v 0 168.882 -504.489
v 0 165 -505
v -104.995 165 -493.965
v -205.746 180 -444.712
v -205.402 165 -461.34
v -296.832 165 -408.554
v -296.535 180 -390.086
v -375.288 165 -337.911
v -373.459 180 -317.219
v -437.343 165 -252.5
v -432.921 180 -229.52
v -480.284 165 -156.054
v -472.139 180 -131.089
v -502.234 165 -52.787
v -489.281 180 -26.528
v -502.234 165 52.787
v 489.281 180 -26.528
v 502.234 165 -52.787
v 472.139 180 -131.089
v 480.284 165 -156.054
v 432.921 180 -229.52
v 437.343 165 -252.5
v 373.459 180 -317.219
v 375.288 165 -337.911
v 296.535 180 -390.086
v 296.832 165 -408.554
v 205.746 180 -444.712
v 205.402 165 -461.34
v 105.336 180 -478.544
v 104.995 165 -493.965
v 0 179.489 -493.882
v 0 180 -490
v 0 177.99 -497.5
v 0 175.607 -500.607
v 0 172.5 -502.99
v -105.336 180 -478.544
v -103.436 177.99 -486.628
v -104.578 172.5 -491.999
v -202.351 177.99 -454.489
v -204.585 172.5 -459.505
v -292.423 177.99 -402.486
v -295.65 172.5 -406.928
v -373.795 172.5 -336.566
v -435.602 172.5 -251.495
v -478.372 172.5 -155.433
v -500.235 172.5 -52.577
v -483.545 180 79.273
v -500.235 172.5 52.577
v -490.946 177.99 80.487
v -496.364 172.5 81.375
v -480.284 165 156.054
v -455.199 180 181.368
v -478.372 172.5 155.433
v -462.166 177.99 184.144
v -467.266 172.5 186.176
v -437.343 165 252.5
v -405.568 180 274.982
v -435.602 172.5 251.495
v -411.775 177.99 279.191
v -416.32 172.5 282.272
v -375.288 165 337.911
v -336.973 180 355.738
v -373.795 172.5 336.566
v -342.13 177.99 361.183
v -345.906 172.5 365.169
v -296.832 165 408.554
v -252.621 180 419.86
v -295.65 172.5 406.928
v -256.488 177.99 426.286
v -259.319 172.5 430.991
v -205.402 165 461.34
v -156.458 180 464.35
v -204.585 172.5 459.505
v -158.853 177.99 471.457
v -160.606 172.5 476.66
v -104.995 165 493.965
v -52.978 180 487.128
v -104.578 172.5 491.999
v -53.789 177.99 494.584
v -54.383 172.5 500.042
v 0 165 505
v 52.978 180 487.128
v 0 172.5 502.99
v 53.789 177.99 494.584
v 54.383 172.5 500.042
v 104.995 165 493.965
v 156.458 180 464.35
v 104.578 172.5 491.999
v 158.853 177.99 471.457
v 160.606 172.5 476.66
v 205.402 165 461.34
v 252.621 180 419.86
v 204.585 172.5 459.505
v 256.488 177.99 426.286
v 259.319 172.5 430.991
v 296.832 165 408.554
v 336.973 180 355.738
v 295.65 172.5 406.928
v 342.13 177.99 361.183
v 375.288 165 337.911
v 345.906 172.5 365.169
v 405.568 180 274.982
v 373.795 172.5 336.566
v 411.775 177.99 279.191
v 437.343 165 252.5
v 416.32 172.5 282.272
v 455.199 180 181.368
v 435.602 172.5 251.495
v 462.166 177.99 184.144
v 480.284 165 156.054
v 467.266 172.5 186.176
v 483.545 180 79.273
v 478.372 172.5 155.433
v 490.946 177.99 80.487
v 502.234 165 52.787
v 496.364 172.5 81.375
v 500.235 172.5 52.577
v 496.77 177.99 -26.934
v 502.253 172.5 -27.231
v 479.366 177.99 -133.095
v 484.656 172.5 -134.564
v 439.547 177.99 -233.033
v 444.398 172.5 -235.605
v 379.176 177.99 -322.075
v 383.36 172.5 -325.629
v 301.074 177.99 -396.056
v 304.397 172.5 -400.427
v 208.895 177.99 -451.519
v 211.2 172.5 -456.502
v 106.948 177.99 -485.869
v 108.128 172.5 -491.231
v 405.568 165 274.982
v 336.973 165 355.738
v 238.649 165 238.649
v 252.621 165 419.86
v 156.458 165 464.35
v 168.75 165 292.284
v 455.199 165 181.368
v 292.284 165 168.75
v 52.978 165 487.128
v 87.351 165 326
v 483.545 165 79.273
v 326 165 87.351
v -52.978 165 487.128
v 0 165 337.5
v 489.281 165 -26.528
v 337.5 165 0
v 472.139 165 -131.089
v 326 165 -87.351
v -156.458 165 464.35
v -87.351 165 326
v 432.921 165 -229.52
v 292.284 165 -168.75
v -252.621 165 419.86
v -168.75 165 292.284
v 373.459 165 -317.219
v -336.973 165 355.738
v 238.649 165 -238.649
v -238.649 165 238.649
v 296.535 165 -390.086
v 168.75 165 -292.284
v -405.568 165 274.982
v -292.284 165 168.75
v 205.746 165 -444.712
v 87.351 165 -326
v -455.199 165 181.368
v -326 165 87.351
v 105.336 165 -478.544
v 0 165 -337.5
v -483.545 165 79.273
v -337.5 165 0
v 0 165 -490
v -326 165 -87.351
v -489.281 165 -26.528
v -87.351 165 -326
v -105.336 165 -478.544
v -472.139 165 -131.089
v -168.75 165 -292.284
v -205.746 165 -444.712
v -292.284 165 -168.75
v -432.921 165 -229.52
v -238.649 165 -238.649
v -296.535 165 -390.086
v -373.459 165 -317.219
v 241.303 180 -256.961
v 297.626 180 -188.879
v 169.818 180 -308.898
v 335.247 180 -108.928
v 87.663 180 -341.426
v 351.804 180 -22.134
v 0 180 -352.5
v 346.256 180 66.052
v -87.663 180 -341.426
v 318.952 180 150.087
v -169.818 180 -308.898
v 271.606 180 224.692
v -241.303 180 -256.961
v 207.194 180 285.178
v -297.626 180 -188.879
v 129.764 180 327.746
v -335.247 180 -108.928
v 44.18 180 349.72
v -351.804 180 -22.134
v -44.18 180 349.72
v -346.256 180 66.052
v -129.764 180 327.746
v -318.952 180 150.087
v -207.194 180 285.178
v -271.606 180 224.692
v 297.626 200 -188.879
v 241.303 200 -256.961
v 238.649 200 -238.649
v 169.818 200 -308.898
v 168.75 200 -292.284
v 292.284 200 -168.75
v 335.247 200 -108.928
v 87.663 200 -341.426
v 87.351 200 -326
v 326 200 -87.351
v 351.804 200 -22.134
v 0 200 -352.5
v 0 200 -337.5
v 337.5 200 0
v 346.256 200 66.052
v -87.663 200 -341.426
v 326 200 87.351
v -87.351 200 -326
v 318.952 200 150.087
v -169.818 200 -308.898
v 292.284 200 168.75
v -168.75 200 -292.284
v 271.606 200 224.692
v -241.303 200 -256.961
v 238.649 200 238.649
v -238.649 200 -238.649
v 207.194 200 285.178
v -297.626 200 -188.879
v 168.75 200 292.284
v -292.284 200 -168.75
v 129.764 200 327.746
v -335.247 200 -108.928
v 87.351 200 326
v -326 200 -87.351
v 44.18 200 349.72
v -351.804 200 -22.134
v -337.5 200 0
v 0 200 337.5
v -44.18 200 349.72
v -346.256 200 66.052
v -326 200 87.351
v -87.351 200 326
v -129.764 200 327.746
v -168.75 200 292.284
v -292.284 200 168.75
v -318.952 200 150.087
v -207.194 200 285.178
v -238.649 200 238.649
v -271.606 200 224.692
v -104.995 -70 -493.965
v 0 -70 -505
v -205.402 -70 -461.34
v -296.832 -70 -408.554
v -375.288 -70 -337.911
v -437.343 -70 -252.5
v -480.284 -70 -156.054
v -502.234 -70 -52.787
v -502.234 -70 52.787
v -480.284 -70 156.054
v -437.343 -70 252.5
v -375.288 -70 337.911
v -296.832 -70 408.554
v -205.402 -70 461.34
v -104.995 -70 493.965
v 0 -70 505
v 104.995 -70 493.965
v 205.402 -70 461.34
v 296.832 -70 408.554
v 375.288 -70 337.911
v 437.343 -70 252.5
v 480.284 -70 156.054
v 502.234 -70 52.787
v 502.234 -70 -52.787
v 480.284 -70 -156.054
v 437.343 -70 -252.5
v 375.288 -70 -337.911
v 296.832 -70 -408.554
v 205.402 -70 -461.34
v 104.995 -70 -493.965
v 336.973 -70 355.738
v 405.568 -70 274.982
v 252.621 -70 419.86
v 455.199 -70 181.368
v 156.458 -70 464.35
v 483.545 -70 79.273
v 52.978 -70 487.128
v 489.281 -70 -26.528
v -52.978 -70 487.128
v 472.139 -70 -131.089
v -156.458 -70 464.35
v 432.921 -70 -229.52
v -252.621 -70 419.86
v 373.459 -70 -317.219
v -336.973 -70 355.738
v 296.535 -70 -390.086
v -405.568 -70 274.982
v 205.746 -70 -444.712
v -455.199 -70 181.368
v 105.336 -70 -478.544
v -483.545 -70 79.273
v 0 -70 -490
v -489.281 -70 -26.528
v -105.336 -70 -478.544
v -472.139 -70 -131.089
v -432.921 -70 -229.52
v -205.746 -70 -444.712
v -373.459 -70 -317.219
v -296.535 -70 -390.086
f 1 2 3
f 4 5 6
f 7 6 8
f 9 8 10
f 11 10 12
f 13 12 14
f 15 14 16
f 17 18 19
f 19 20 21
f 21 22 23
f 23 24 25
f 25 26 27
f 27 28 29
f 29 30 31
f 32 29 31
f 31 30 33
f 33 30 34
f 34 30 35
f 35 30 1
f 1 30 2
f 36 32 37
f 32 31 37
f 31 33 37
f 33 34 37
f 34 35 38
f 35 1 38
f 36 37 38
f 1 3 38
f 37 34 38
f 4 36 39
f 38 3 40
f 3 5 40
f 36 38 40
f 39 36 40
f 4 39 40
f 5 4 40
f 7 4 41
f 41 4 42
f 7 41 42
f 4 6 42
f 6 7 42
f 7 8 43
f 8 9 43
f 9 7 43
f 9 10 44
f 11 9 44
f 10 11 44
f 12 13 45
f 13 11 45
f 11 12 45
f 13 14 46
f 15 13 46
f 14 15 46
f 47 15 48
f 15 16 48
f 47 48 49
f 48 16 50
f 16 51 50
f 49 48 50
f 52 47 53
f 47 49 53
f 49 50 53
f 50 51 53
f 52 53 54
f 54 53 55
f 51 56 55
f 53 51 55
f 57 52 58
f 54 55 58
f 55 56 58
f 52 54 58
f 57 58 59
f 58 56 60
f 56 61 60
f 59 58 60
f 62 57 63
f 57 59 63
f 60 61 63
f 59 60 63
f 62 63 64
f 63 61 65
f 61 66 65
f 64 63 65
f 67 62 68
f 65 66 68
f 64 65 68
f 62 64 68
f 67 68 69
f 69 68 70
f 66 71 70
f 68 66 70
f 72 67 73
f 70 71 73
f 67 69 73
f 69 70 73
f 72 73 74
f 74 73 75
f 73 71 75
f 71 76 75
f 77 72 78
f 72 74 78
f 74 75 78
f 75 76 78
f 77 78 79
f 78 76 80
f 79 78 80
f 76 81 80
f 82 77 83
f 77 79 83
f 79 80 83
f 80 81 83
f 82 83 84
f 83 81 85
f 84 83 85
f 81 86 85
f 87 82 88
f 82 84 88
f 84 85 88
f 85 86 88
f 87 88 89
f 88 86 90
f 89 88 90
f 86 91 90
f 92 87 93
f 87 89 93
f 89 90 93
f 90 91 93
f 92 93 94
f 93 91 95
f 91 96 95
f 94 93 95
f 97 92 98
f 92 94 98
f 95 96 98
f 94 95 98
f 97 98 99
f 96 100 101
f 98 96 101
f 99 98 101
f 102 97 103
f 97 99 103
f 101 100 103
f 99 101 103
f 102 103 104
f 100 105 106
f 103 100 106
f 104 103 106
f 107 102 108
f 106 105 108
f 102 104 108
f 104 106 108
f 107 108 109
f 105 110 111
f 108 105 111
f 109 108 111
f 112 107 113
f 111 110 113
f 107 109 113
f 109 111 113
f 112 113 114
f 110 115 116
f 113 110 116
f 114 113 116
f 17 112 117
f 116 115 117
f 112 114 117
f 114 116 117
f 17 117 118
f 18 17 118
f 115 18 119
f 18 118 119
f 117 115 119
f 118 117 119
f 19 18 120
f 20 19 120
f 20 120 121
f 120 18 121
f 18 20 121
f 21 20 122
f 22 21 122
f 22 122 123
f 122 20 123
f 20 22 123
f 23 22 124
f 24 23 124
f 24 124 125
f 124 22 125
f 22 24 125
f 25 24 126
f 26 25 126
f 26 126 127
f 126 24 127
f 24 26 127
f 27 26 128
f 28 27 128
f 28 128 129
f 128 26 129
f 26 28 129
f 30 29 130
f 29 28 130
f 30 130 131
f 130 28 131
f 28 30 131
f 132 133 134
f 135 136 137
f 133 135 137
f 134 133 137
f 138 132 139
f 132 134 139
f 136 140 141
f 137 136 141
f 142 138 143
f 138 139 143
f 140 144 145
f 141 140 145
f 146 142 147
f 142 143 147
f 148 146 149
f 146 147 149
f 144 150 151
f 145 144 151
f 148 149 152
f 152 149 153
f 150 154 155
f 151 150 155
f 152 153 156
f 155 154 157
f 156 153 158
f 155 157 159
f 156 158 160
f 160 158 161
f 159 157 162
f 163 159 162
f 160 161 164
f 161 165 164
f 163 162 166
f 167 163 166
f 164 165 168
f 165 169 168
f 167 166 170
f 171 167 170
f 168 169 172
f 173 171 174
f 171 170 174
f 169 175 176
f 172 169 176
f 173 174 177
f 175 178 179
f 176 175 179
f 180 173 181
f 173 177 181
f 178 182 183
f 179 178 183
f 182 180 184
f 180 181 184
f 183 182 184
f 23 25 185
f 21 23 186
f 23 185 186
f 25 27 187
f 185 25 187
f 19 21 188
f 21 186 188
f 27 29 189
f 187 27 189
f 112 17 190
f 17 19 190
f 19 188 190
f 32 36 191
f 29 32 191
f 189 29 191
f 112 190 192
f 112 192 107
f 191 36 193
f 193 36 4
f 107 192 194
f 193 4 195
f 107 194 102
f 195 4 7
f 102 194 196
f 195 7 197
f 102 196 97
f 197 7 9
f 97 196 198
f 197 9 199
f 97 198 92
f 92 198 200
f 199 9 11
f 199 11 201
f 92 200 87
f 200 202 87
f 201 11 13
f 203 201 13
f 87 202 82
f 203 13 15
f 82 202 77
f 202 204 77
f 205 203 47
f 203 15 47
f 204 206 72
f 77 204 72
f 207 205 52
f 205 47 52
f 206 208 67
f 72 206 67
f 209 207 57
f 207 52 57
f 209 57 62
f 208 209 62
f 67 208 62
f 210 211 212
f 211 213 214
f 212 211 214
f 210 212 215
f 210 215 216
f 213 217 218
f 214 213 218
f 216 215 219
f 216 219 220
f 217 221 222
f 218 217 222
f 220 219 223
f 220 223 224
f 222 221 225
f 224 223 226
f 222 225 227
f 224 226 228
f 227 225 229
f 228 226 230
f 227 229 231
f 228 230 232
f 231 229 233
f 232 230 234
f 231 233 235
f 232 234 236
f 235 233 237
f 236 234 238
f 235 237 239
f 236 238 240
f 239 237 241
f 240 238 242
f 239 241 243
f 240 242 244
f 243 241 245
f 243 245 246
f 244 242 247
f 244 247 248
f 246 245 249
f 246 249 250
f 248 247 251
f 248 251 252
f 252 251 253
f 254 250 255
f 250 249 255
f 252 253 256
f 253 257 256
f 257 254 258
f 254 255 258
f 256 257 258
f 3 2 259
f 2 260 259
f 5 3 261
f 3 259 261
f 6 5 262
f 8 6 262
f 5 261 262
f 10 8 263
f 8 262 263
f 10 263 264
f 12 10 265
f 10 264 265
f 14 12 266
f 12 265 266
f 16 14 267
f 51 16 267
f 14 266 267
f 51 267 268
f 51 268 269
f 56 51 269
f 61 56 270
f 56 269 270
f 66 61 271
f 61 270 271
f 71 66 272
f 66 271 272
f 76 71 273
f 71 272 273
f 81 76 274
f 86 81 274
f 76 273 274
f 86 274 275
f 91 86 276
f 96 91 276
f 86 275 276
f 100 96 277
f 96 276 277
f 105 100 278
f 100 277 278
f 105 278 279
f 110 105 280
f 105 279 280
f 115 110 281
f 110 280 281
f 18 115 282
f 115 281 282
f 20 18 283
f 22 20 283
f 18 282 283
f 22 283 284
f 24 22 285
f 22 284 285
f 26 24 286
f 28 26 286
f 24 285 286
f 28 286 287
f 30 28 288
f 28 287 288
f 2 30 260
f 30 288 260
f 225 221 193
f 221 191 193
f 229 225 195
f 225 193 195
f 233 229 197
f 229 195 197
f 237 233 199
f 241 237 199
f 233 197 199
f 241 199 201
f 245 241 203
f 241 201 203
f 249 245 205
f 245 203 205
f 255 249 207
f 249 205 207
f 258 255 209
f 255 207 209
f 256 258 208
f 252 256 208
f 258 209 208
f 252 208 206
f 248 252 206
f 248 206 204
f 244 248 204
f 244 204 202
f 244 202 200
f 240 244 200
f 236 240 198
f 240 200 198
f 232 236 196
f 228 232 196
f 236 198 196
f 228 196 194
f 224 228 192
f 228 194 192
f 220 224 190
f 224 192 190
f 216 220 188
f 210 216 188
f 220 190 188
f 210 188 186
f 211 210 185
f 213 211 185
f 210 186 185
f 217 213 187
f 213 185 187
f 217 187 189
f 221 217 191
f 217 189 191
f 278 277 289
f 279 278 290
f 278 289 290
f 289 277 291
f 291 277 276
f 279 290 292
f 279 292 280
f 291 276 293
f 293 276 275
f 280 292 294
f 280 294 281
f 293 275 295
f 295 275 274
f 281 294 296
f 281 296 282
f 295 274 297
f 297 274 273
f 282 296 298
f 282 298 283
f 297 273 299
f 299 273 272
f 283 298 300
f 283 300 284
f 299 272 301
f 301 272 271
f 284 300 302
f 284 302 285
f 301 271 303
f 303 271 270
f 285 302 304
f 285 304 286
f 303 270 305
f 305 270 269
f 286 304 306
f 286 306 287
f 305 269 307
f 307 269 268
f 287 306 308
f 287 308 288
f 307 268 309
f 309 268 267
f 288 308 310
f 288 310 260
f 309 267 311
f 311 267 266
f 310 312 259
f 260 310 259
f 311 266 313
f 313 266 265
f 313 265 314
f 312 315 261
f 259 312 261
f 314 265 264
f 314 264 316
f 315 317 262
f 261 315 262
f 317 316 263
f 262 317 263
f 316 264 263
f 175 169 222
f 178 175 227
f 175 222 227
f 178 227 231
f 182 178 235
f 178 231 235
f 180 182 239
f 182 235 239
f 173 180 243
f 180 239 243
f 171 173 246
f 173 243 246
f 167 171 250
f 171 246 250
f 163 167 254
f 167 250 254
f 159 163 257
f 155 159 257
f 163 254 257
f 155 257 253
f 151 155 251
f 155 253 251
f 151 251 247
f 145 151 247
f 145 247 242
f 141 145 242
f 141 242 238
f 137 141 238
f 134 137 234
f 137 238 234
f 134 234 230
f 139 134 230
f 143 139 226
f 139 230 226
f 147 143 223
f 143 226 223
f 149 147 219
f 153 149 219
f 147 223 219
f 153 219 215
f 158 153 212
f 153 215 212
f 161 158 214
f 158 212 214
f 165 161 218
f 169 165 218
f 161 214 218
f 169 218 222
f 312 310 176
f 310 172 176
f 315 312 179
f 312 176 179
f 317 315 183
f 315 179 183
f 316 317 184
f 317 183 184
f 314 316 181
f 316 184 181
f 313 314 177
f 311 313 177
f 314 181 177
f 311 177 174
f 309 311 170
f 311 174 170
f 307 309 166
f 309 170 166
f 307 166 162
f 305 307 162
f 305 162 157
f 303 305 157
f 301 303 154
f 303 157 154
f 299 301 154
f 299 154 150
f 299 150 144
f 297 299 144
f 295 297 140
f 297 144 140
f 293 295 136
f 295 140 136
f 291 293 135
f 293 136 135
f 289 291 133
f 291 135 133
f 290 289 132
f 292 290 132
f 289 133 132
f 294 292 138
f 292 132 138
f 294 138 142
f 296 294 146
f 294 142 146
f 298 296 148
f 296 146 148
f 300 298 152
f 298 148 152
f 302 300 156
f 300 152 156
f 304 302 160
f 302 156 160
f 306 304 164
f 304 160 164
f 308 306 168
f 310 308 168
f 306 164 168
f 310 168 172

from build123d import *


with BuildPart() as part:
    # Sketch6 → Revolve1 (revolve)
    with BuildSketch(Plane.XY, mode=Mode.PRIVATE) as revolve1_sk:
        with BuildLine():
            Line((337.5, 165), (337.5, 200))
            Line((337.5, 200), (352.5, 200))
            Line((352.5, 200), (352.5, 180))
            Line((352.5, 180), (490, 180))
            ThreePointArc((490, 180), (500.606601718, 175.606601718), (505, 165))
            Line((505, 165), (505, 0))
            Line((505, 0), (505, -70))
            Line((505, -70), (490, -70))
            Line((490, -70), (490, 0))
            Line((490, 0), (490, 165))
            Line((490, 165), (337.5, 165))
        make_face()
    revolve(revolve1_sk.sketch.rotate(Axis((0, 0, 0), (0, 1, 0)), 90), axis=Axis((0, 0, 0), (0, 1, 0)))


solid = part.part
